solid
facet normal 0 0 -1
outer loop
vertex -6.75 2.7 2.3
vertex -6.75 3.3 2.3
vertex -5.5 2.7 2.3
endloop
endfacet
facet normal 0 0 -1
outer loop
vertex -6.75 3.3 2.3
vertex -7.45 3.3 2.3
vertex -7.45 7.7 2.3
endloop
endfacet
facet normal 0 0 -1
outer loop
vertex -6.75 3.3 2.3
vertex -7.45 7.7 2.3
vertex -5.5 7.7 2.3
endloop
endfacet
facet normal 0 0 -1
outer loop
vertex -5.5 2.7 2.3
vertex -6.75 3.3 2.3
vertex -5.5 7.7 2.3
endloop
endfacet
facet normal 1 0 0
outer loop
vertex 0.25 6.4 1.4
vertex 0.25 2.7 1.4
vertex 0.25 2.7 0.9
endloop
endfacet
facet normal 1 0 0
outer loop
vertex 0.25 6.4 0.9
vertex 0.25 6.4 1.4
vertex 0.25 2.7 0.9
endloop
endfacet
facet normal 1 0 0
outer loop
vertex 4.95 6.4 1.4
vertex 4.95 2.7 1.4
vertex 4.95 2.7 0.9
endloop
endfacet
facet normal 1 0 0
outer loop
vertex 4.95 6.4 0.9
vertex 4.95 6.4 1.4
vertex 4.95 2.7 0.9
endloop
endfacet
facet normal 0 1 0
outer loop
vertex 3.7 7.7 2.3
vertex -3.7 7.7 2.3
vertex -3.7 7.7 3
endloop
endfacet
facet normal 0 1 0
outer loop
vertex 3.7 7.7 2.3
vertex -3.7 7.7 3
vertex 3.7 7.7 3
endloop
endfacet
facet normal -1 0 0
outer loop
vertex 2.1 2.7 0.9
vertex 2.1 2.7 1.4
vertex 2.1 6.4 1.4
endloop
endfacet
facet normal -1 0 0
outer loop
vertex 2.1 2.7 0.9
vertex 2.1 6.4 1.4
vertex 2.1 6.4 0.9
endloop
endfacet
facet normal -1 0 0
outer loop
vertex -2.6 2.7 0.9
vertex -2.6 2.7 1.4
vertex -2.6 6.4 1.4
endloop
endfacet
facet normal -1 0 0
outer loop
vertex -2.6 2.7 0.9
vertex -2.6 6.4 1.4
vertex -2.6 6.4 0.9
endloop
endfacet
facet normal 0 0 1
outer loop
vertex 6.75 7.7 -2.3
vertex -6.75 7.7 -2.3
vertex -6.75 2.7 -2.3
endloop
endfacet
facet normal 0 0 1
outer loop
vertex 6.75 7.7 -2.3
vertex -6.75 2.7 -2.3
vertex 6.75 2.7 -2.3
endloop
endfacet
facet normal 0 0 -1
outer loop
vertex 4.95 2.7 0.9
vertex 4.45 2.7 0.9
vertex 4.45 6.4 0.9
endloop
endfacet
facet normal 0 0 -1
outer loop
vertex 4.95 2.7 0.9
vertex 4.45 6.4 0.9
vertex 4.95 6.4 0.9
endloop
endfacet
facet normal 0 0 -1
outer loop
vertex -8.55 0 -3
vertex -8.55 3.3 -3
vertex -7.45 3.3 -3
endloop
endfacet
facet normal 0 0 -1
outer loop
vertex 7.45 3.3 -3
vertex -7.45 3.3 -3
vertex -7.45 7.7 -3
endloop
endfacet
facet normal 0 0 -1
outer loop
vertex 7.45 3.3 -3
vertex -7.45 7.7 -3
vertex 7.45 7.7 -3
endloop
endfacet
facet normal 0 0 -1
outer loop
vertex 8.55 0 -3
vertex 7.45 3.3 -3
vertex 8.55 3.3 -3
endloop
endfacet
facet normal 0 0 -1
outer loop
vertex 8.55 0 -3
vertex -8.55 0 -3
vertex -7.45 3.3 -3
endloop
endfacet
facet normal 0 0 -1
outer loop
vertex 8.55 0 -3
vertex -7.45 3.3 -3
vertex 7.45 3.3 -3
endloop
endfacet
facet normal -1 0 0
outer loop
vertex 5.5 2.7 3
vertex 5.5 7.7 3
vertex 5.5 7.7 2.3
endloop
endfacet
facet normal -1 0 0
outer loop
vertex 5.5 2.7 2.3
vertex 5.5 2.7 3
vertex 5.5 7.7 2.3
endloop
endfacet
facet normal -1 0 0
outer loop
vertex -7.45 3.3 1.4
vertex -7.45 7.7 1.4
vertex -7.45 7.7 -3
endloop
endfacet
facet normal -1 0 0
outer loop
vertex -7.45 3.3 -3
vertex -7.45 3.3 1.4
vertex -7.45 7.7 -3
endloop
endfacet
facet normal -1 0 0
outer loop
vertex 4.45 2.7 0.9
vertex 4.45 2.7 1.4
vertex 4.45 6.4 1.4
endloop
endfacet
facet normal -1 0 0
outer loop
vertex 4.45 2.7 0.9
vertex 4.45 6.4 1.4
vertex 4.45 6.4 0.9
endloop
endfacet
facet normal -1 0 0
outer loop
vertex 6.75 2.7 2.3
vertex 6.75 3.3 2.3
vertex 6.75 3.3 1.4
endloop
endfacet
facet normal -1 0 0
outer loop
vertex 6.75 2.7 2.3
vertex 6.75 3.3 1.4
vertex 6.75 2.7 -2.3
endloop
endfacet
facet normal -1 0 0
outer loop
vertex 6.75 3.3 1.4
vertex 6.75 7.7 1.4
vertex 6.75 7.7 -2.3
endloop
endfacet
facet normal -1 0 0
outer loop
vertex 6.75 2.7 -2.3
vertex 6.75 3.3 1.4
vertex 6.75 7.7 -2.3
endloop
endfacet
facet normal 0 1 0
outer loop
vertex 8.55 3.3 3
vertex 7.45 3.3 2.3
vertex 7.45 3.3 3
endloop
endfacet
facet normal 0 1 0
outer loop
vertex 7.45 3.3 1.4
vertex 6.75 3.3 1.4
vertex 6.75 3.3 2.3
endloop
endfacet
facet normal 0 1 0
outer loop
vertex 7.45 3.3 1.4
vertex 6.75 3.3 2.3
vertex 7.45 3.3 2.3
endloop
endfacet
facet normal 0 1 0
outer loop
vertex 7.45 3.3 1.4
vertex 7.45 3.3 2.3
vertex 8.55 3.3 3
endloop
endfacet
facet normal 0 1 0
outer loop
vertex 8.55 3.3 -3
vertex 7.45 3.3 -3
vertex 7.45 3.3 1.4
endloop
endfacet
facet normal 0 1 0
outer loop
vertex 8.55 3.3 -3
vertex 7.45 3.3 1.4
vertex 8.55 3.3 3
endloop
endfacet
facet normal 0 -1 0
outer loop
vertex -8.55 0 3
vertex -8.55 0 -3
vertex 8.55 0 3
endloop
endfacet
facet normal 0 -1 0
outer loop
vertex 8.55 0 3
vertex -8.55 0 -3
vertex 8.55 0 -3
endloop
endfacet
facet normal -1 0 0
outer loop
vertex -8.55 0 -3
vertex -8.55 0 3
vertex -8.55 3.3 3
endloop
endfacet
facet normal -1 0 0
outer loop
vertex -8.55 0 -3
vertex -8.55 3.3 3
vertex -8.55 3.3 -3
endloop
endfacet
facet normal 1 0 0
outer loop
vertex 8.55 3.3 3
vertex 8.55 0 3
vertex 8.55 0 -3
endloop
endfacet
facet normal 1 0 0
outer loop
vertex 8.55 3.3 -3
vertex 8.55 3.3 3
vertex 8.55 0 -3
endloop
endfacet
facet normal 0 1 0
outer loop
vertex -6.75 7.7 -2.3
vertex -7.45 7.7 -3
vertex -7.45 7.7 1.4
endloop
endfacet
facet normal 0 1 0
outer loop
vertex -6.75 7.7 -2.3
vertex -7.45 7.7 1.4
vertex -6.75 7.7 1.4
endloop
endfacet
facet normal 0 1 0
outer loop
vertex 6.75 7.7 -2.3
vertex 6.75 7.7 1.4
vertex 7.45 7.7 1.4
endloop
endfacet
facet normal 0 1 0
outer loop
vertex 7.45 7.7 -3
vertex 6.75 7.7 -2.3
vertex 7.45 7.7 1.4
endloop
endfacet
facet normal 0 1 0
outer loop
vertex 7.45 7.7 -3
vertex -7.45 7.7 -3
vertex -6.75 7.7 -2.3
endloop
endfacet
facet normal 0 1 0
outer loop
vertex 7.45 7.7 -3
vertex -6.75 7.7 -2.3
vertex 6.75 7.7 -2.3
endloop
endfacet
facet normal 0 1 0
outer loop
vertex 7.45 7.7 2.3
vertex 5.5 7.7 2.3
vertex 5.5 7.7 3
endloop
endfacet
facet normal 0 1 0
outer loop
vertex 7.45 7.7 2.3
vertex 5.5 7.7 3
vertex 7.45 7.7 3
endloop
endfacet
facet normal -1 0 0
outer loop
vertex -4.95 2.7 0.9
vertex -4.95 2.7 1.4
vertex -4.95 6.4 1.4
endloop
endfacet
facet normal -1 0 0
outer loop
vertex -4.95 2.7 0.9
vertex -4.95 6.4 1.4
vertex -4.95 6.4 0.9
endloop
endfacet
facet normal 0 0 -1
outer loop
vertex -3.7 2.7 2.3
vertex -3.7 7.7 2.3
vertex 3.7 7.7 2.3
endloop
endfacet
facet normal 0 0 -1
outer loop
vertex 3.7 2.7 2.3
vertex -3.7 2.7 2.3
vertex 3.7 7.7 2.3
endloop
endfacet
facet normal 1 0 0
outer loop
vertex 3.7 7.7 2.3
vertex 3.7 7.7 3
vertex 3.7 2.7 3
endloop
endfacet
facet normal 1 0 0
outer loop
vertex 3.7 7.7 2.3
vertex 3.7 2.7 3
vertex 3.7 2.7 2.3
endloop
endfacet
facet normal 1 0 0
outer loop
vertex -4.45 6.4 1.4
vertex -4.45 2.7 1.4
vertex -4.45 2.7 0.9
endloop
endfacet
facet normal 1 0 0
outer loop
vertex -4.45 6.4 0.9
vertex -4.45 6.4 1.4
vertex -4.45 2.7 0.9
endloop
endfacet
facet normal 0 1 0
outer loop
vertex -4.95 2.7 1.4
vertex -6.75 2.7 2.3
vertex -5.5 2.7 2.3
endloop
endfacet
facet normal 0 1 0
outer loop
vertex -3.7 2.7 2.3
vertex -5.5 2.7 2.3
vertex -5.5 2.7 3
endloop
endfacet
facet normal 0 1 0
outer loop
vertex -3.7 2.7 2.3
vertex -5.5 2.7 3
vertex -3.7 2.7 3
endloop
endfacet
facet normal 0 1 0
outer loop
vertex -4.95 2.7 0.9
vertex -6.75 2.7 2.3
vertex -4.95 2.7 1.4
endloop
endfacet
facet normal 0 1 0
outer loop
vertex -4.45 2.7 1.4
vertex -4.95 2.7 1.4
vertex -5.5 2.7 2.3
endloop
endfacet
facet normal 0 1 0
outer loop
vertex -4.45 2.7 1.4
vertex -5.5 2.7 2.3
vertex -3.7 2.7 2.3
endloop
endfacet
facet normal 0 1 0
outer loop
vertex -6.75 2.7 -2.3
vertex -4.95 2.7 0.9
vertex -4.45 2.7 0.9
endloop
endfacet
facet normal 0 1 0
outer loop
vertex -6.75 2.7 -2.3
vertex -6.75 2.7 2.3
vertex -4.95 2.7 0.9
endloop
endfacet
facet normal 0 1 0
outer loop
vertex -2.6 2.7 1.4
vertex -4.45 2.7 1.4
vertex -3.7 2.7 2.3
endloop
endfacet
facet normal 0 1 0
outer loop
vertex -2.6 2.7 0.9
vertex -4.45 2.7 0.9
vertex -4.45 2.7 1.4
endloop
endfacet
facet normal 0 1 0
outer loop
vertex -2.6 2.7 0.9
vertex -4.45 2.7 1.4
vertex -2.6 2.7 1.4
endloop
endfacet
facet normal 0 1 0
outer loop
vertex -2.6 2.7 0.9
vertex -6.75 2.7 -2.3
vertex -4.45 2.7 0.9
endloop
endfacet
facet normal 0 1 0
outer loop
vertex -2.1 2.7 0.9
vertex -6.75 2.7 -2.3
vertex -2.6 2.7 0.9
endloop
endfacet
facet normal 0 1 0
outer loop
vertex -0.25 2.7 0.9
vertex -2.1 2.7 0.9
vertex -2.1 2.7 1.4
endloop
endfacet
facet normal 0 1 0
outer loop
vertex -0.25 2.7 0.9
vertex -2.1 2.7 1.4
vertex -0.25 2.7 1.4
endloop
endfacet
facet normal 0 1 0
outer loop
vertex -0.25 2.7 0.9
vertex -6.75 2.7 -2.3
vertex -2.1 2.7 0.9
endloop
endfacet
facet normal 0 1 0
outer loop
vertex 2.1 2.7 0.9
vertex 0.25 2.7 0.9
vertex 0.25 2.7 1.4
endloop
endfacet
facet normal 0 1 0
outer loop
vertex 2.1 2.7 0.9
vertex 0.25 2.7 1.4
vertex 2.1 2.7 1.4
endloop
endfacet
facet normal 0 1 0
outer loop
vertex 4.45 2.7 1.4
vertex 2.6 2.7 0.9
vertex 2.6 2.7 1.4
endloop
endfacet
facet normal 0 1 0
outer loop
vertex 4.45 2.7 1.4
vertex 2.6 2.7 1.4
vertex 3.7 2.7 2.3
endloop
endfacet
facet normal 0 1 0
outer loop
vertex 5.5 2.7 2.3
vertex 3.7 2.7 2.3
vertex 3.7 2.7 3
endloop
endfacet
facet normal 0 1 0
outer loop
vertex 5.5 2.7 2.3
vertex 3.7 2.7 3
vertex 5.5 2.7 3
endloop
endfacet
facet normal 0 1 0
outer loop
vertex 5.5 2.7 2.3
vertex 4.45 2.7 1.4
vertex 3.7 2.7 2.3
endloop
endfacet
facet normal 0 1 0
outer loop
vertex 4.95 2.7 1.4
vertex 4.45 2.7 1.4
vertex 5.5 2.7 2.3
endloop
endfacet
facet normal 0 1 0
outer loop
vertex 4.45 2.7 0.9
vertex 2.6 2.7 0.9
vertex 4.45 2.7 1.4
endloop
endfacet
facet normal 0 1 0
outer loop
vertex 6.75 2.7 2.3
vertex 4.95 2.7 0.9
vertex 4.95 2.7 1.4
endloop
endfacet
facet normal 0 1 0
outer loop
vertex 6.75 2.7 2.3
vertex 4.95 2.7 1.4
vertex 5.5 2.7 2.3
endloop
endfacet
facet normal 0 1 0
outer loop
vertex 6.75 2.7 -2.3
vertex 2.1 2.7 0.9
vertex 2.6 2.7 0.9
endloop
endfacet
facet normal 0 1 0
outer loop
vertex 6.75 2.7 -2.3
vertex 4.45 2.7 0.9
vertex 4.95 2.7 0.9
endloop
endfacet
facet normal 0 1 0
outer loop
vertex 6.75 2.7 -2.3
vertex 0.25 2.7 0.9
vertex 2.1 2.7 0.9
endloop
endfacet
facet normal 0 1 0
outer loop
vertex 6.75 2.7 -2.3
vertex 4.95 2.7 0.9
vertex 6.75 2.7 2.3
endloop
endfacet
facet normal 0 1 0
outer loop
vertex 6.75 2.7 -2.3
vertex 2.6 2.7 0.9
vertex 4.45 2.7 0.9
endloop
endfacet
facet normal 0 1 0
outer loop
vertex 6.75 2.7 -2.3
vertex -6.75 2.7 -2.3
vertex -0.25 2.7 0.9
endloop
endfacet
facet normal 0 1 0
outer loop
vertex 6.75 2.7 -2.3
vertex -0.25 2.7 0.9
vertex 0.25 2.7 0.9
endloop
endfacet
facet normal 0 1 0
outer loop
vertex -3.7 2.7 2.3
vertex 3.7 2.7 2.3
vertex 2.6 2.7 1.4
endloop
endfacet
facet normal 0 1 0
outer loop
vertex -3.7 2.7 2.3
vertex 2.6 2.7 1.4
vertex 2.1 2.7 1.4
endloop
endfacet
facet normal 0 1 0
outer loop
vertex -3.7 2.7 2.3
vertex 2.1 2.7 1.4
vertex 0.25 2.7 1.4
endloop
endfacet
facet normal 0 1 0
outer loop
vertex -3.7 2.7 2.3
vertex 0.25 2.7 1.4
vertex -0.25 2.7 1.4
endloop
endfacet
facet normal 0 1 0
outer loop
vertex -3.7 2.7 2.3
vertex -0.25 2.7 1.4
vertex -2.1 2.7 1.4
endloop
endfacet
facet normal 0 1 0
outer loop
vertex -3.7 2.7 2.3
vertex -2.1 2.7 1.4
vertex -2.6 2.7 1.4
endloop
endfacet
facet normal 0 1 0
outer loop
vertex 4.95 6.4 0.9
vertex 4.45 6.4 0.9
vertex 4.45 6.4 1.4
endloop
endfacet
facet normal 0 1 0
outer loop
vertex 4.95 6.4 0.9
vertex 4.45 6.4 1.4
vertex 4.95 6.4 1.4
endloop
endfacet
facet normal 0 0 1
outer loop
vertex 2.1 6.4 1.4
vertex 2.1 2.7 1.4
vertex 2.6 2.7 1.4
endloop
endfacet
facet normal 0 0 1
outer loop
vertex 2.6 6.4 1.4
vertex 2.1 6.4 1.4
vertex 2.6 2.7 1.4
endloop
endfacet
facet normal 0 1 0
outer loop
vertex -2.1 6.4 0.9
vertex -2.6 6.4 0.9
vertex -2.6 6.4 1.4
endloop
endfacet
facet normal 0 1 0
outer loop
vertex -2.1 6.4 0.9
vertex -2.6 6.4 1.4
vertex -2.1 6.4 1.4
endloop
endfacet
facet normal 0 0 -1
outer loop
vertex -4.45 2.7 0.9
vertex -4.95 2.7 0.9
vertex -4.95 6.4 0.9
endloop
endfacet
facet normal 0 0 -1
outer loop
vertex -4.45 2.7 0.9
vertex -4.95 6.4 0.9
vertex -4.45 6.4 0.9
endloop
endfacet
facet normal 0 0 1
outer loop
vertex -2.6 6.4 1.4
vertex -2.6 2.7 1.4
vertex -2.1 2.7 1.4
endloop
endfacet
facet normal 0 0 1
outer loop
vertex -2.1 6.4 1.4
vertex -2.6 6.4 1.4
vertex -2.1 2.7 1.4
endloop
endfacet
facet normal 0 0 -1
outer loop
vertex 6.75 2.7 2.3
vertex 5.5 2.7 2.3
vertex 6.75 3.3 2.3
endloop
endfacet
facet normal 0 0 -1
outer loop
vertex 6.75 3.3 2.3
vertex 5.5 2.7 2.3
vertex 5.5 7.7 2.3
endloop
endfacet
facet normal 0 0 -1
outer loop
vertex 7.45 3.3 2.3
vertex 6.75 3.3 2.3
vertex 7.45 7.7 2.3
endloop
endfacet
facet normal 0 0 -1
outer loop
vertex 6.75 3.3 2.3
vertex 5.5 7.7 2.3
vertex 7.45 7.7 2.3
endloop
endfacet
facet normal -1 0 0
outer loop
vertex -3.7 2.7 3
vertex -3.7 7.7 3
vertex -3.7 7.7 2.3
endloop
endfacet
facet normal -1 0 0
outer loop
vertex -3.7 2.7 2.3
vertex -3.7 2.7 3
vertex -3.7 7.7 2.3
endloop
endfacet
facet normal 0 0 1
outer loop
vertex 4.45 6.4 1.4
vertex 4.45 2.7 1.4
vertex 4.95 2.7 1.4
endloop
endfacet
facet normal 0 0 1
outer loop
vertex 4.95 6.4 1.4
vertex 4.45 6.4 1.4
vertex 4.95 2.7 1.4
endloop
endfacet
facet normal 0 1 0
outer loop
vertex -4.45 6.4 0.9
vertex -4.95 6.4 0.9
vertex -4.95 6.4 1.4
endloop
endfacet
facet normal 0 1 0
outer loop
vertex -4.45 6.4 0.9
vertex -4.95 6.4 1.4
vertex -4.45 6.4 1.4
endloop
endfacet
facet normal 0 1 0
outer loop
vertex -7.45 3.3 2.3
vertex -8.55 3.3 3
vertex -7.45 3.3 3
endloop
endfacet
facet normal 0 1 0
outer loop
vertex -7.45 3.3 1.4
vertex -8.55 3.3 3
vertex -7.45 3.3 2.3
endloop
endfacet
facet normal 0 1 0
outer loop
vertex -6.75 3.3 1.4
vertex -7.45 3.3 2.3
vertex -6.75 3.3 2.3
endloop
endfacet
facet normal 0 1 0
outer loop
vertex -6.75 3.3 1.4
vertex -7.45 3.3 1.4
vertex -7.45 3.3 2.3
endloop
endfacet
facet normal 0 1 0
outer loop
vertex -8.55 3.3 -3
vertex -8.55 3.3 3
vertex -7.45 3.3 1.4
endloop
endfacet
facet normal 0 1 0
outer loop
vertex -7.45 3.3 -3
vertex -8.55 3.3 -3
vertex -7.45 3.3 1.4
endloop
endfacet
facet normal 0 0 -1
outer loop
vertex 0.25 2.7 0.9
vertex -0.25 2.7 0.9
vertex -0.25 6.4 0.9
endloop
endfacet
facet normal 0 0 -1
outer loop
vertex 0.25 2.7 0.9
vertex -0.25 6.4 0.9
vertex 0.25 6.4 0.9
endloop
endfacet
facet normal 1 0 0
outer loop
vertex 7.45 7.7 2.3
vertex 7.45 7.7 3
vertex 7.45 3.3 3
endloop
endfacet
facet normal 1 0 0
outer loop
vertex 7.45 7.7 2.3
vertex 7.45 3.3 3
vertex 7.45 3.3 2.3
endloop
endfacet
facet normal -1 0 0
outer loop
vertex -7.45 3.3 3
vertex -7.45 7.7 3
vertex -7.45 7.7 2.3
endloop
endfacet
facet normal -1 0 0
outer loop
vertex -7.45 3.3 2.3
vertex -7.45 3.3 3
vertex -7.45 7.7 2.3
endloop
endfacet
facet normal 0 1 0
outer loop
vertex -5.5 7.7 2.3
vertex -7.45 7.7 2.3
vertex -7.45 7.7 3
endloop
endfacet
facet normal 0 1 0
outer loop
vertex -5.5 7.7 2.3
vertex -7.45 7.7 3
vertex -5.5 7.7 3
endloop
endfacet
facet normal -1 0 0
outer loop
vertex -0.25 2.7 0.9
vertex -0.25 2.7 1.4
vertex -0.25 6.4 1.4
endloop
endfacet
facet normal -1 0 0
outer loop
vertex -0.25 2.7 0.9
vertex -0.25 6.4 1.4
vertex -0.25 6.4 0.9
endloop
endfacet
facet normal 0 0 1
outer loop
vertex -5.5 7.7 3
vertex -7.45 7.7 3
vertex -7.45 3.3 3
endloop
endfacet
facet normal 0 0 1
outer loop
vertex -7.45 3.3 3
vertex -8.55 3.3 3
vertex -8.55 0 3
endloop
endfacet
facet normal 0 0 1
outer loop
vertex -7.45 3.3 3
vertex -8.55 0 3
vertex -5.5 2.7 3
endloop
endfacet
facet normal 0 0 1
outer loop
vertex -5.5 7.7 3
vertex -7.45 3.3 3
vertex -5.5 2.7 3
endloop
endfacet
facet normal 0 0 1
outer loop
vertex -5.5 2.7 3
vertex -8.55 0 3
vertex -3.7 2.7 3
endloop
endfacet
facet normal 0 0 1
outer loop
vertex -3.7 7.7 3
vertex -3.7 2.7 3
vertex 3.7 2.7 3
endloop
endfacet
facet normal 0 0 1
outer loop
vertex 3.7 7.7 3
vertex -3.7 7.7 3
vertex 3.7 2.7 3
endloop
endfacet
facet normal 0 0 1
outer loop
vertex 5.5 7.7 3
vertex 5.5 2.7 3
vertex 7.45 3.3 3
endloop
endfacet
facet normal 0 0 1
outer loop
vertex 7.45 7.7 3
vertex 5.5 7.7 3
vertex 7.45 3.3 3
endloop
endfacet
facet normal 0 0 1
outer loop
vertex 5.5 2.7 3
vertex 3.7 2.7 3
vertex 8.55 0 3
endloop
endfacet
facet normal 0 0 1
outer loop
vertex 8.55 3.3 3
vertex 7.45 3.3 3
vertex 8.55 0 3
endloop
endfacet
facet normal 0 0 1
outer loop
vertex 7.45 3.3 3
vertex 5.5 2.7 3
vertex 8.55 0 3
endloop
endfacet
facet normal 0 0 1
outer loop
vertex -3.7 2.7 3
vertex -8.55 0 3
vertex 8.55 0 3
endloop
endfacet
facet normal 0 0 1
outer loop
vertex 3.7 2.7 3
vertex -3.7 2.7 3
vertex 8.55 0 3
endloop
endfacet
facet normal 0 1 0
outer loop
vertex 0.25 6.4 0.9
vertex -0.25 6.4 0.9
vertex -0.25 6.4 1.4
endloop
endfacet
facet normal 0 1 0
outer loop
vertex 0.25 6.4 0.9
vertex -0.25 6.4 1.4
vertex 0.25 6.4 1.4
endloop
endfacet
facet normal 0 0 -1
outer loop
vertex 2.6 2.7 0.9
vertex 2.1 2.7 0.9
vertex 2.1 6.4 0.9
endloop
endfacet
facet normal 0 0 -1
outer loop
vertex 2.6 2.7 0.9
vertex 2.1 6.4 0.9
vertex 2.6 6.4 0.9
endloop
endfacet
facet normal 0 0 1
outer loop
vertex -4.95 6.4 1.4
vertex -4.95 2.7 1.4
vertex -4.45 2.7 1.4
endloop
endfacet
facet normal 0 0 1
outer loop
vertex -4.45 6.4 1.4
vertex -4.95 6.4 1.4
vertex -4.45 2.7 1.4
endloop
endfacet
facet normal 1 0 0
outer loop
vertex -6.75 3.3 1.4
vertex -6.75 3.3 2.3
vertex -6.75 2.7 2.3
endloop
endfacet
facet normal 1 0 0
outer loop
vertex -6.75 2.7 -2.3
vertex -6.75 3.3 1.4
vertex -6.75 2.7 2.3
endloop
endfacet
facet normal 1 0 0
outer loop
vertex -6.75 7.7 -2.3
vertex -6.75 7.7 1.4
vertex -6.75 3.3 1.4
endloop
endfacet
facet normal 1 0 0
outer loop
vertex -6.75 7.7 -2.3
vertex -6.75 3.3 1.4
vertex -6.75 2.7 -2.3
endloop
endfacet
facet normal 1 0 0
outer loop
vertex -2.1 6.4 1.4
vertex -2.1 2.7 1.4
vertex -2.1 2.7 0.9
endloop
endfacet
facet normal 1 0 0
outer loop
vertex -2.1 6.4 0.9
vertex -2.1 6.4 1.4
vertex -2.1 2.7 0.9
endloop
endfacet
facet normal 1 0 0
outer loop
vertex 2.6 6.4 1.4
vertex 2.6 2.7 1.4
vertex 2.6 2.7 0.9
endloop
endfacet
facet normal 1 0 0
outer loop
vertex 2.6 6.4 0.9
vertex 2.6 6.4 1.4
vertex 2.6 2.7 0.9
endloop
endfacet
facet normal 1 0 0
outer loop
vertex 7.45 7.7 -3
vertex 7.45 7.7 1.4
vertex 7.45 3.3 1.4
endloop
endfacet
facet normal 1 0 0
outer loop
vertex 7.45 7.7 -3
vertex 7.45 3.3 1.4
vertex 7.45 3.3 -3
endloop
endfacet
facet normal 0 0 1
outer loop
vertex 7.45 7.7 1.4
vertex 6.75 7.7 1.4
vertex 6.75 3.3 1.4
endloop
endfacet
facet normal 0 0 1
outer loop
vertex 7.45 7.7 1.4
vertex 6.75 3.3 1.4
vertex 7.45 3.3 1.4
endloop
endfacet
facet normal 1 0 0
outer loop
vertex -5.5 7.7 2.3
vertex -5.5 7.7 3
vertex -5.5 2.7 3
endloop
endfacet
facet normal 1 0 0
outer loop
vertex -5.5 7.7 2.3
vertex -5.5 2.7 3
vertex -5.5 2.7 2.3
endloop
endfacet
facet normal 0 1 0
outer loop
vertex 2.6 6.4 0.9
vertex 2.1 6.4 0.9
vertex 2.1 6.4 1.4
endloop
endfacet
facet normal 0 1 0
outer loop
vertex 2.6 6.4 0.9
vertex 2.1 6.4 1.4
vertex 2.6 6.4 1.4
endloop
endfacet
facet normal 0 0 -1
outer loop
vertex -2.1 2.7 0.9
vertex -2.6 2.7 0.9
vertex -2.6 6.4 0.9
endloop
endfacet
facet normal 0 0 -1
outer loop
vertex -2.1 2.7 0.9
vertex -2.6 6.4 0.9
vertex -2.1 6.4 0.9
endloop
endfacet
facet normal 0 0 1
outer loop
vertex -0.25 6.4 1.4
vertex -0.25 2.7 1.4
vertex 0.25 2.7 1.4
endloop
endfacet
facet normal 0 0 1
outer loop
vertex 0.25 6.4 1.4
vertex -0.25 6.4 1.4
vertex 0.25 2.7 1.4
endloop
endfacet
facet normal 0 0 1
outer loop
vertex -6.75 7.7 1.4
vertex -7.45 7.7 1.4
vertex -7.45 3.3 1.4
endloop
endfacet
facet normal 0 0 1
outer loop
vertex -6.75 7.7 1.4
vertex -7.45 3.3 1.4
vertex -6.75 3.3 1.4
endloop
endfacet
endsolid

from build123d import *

# Parameters (mm, degrees)
SKETCH1_W           = 17.1
SKETCH1_H           = 6
BOSS_EXTRUDE1_DEPTH = 7.7
SKETCH2_W           = 13.5
SKETCH2_H           = 4.6
CUT_EXTRUDE1_DEPTH  = 5
SKETCH3_W           = 1.1
SKETCH3_H           = 6
CUT_EXTRUDE2_DEPTH  = 4.4
SKETCH4_W           = 1.8
SKETCH4_H           = 0.7
CUT_EXTRUDE3_DEPTH  = 5
SKETCH5_W           = 14.9
SKETCH5_H           = 0.9
CUT_EXTRUDE4_DEPTH  = 4.4
SKETCH6_W           = 0.5
SKETCH6_H           = 0.5
BOSS_EXTRUDE2_DEPTH = 3.7


with BuildPart() as part:
    # Sketch1 → Boss-Extrude1 (new body)
    with BuildSketch(Plane(origin=(0, 0, 0), x_dir=(1, 0, 0), z_dir=(0, 1, 0))):
        Rectangle(SKETCH1_W, SKETCH1_H)
    extrude(amount=BOSS_EXTRUDE1_DEPTH)

    # Sketch2 → Cut-Extrude1 (cut)
    with BuildSketch(Plane(origin=(0, 7.7, 0), x_dir=(1, 0, 0), z_dir=(0, 1, 0))):
        Rectangle(SKETCH2_W, SKETCH2_H)
    extrude(amount=-CUT_EXTRUDE1_DEPTH, mode=Mode.SUBTRACT)

    # Sketch3 → Cut-Extrude2 (cut)
    with BuildSketch(Plane(origin=(0, 7.7, 0), x_dir=(1, 0, 0), z_dir=(0, 1, 0))):
        with Locations((-8, 0)):
            Rectangle(SKETCH3_W, SKETCH3_H)
        with Locations((8, 0)):
            Rectangle(SKETCH3_W, SKETCH3_H)
    extrude(amount=-CUT_EXTRUDE2_DEPTH, mode=Mode.SUBTRACT)

    # Sketch4 → Cut-Extrude3 (cut)
    with BuildSketch(Plane(origin=(0, 7.7, 0), x_dir=(1, 0, 0), z_dir=(0, 1, 0))):
        with Locations((-4.6, -2.65)):
            Rectangle(SKETCH4_W, SKETCH4_H)
        with Locations((4.6, -2.65)):
            Rectangle(SKETCH4_W, SKETCH4_H)
    extrude(amount=-CUT_EXTRUDE3_DEPTH, mode=Mode.SUBTRACT)

    # Sketch5 → Cut-Extrude4 (cut)
    with BuildSketch(Plane(origin=(0, 7.7, 0), x_dir=(1, 0, 0), z_dir=(0, 1, 0))):
        with Locations((0, -1.85)):
            Rectangle(SKETCH5_W, SKETCH5_H)
    extrude(amount=-CUT_EXTRUDE4_DEPTH, mode=Mode.SUBTRACT)

    # Sketch6 → Boss-Extrude2 (add)
    with BuildSketch(Plane(origin=(0, 2.7, 0), x_dir=(1, 0, 0), z_dir=(0, 1, 0))):
        with Locations((0, -1.15)):
            Rectangle(SKETCH6_W, SKETCH6_H)
        with Locations((-2.35, -1.15)):
            Rectangle(SKETCH6_W, SKETCH6_H)
        with Locations((2.35, -1.15)):
            Rectangle(SKETCH6_W, SKETCH6_H)
        with Locations((4.7, -1.15)):
            Rectangle(SKETCH6_W, SKETCH6_H)
        with Locations((-4.7, -1.15)):
            Rectangle(SKETCH6_W, SKETCH6_H)
    extrude(amount=BOSS_EXTRUDE2_DEPTH)


solid = part.part
